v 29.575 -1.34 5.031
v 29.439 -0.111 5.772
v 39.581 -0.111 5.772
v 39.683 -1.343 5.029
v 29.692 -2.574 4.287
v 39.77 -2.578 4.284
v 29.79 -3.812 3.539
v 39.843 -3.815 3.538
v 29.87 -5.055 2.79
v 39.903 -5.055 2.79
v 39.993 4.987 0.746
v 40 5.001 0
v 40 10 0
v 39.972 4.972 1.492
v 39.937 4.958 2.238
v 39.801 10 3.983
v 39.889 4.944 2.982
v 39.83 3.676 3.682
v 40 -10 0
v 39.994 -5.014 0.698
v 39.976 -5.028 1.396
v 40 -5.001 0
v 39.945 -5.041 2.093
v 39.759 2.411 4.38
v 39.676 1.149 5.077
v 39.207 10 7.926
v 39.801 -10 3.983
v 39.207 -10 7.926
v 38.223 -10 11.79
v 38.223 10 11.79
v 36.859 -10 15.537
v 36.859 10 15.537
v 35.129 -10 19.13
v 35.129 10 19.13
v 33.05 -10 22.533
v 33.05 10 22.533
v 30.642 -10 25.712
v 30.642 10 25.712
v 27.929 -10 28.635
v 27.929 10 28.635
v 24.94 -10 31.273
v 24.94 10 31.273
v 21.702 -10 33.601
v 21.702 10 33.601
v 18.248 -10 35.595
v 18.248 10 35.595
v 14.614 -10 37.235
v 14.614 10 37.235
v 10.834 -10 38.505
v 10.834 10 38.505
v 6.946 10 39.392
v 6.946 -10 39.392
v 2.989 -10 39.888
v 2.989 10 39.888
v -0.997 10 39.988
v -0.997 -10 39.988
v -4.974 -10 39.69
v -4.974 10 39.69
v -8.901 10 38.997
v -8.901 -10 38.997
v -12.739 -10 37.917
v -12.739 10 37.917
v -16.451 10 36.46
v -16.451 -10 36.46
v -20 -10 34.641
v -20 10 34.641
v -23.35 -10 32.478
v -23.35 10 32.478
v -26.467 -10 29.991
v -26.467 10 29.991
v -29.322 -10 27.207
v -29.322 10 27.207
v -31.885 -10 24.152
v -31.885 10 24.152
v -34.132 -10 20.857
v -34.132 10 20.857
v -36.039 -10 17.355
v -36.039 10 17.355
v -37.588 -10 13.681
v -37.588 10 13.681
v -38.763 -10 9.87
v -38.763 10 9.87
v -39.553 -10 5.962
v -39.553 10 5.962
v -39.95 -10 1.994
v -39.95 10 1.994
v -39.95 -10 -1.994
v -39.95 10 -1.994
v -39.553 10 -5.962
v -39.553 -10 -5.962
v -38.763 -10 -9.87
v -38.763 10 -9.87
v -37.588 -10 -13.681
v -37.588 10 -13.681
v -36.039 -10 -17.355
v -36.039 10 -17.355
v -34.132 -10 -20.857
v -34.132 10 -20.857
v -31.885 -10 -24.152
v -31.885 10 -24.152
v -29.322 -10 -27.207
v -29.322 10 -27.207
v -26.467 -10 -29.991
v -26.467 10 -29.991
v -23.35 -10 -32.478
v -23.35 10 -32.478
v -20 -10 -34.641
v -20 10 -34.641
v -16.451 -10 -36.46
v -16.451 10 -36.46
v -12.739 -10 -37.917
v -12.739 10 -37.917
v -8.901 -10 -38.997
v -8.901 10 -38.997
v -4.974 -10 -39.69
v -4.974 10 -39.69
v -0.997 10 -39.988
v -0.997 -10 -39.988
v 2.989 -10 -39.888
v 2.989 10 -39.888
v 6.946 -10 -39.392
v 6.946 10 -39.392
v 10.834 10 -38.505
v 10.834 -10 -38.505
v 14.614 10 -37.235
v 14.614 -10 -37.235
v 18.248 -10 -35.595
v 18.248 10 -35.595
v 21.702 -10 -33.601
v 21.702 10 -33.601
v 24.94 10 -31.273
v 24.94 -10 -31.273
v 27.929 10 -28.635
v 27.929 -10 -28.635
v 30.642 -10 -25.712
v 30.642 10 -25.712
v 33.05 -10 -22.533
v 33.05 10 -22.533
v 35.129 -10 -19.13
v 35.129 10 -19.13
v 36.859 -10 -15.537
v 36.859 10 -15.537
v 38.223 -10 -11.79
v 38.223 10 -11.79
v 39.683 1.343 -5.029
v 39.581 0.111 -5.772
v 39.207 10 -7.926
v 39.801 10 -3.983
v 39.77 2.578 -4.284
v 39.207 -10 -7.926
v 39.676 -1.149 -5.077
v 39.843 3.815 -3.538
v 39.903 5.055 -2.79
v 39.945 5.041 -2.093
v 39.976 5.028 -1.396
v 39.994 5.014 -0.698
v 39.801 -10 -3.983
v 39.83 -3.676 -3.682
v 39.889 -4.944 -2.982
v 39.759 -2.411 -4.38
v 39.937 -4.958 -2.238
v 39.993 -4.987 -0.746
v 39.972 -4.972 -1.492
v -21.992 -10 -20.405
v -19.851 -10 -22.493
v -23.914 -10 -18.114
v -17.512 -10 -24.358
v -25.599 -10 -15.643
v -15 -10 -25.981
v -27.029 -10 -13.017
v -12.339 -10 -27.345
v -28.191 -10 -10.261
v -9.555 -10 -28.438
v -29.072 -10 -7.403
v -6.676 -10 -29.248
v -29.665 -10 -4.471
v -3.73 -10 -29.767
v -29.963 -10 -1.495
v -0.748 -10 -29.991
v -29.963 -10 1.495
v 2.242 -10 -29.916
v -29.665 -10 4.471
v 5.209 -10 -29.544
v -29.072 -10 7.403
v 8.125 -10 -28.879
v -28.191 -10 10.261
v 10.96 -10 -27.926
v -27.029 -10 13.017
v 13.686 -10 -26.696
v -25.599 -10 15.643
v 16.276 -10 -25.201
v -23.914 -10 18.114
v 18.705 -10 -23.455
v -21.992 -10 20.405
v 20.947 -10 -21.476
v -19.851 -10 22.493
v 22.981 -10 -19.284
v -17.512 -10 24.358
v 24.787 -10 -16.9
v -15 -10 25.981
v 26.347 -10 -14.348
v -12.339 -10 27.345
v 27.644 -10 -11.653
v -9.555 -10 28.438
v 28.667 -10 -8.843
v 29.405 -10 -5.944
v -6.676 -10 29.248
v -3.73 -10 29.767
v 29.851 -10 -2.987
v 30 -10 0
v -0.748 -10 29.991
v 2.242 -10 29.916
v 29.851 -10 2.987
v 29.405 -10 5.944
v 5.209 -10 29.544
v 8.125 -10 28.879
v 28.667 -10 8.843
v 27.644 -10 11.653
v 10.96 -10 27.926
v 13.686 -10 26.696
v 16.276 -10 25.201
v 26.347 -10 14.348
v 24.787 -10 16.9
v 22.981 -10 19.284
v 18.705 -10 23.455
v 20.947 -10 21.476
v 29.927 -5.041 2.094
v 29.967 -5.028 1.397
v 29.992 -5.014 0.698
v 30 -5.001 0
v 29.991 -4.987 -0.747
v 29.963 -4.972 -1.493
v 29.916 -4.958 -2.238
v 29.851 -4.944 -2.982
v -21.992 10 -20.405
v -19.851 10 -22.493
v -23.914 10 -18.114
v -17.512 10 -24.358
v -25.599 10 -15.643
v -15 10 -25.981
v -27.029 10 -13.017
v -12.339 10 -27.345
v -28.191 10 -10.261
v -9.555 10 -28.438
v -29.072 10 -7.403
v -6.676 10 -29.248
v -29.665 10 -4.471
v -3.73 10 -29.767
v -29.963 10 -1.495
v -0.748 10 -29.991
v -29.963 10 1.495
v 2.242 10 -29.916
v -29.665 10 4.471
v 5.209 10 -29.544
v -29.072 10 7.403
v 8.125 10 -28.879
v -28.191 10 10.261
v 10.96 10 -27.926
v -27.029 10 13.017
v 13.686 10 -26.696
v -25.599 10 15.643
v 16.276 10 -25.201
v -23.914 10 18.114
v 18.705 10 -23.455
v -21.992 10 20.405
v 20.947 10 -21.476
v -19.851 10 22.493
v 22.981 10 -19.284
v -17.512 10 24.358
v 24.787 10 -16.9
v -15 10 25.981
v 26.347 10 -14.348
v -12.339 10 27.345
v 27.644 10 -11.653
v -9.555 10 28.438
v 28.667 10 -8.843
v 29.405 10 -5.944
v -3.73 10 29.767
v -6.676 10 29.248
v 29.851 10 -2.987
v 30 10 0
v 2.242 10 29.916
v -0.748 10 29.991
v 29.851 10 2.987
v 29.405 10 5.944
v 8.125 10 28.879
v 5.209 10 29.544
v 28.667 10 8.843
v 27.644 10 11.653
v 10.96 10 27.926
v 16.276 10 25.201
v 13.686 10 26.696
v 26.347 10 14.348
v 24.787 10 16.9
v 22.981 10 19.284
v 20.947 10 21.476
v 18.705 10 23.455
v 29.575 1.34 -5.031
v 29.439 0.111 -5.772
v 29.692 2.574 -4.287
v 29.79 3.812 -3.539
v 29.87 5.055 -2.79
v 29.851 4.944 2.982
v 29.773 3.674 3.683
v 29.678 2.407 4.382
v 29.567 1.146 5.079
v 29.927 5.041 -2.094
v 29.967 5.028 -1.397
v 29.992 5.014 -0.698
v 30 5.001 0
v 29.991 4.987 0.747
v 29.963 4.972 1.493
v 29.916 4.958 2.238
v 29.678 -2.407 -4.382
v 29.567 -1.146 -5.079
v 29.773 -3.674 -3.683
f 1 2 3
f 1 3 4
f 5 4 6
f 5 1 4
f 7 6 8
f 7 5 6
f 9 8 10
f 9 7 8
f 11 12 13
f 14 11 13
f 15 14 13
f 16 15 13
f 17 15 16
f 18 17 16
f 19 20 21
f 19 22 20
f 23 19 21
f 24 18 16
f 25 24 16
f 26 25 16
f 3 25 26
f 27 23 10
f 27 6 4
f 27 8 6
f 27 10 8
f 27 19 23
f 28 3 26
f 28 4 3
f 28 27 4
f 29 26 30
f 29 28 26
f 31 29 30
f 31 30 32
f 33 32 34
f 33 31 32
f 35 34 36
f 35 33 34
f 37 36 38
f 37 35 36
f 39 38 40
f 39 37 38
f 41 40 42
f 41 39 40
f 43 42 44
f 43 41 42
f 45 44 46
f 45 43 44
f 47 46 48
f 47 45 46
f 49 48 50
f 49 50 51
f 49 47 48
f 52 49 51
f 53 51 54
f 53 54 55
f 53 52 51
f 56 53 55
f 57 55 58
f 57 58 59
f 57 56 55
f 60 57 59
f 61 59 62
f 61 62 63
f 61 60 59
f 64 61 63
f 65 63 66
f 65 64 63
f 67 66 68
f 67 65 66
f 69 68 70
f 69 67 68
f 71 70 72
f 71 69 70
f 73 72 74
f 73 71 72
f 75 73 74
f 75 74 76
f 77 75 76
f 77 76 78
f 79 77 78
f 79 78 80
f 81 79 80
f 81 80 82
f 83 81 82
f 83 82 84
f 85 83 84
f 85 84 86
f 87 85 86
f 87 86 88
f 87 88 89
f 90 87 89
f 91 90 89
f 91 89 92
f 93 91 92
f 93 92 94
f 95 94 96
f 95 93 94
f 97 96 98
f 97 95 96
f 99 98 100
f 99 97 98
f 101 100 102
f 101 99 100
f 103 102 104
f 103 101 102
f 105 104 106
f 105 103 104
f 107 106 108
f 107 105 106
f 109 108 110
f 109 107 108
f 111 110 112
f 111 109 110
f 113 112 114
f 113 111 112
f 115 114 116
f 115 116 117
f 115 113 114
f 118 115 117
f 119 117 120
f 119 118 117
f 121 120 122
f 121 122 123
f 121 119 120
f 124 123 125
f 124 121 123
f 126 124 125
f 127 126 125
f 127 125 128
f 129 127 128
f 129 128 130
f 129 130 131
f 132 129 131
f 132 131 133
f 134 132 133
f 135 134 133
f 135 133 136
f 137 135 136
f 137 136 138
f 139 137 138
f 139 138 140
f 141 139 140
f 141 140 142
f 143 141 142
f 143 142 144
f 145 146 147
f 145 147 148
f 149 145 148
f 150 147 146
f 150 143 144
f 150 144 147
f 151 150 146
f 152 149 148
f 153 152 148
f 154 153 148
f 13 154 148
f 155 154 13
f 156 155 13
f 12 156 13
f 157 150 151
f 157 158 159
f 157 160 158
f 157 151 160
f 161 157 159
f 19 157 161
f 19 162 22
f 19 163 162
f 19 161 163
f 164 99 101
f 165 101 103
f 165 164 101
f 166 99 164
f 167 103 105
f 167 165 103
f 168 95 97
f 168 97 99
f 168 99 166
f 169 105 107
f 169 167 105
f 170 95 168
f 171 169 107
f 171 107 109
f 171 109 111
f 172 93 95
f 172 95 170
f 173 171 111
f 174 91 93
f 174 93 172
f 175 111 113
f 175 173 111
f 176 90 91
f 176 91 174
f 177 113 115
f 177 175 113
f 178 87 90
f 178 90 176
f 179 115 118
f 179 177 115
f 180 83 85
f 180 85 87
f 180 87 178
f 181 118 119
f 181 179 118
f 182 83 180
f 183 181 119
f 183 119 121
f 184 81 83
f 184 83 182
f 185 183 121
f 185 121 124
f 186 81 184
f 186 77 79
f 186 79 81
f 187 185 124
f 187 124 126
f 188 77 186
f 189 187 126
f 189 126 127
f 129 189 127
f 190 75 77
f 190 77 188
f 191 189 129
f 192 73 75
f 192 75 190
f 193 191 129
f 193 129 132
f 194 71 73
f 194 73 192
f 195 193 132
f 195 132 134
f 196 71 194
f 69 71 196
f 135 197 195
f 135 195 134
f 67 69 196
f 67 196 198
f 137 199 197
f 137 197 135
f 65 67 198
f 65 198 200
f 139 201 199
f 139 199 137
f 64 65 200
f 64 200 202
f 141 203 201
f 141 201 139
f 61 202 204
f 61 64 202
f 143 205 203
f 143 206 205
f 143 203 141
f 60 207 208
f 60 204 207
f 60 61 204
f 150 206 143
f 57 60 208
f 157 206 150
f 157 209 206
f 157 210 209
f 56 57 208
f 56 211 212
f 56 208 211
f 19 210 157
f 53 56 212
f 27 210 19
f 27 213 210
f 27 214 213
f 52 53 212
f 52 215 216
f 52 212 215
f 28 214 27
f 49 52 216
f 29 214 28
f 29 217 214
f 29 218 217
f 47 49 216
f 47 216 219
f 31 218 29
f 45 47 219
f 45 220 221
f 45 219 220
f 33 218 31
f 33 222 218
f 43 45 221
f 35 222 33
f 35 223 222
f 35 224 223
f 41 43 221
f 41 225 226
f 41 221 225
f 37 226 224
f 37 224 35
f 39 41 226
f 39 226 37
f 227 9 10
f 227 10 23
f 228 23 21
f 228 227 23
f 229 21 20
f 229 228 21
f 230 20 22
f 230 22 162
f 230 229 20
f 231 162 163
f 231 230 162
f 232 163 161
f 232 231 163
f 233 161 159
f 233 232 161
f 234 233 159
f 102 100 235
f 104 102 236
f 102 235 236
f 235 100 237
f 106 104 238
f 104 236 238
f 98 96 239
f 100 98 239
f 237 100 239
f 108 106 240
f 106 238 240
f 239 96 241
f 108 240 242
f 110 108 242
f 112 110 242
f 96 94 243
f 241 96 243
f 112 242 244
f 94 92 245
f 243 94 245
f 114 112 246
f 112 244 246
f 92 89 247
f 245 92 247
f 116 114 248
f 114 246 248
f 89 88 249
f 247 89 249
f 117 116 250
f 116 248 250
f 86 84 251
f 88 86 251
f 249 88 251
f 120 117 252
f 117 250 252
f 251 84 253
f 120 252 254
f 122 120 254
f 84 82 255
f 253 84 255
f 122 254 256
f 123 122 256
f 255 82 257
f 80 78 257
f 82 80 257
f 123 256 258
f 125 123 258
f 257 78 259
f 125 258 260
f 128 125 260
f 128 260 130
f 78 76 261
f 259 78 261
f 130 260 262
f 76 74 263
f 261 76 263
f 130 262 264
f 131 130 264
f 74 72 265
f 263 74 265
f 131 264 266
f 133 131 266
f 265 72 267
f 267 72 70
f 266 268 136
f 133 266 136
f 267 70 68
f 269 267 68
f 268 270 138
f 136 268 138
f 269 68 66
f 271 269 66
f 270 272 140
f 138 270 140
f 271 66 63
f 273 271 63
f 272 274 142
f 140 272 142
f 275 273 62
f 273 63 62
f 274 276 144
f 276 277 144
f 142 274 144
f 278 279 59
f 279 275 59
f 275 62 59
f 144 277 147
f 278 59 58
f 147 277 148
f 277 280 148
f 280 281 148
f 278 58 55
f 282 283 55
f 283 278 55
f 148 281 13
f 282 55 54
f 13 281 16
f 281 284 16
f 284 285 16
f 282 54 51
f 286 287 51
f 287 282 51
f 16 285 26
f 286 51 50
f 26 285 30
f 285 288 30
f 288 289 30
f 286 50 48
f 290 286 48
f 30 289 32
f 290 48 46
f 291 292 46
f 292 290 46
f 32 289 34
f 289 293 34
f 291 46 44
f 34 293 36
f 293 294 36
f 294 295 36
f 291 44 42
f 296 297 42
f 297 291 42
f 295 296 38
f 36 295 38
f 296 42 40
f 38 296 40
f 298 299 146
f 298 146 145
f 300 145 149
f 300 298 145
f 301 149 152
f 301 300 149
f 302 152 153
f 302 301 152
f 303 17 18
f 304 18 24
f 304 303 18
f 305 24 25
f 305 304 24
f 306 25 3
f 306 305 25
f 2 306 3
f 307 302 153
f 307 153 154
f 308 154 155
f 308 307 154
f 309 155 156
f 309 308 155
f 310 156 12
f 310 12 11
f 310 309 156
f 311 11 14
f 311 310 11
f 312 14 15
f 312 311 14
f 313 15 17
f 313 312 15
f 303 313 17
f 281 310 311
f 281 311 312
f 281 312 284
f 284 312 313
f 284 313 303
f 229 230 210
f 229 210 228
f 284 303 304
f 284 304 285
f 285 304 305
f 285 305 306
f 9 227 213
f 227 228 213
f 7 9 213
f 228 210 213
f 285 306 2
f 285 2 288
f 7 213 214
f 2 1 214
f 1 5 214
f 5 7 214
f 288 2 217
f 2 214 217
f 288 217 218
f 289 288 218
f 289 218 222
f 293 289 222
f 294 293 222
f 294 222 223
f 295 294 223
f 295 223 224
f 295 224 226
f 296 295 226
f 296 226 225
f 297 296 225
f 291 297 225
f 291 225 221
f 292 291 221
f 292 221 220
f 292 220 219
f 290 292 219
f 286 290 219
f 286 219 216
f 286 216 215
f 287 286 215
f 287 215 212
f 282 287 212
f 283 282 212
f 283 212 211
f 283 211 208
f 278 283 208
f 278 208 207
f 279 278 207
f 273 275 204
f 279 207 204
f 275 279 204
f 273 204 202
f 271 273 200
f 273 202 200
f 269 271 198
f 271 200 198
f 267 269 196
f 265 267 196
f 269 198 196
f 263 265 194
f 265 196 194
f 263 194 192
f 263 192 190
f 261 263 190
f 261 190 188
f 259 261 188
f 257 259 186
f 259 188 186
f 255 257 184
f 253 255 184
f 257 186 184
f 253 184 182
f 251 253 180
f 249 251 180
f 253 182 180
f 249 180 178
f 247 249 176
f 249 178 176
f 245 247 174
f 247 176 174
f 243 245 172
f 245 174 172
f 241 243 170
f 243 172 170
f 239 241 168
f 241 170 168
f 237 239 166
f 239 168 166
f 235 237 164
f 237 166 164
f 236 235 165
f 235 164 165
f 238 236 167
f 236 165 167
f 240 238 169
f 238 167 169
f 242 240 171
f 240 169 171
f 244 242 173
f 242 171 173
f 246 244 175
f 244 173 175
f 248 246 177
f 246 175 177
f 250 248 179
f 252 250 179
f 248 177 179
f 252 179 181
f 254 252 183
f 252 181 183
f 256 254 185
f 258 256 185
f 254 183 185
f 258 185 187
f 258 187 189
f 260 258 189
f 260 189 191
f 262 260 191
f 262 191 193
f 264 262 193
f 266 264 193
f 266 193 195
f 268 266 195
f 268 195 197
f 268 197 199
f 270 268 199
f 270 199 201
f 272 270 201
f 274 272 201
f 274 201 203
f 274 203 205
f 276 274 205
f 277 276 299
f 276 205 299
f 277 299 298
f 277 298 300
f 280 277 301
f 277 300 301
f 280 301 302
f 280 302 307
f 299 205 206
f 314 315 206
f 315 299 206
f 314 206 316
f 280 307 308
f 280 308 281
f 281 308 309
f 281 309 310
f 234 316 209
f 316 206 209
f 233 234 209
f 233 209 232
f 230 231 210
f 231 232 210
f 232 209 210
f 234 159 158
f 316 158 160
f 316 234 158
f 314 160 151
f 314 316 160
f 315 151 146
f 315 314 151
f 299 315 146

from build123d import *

# Parameters (mm, degrees)
F0_R     = 40
F1_DEPTH = 10
F2_R     = 30
F3_DEPTH = 20
F5_DEPTH = 60


with BuildPart() as f1:
    # F0 (on Front) → F1 (new body, symmetric)
    with BuildSketch(Plane.XZ):
        Circle(F0_R)
    extrude(amount=F1_DEPTH, both=True)

    # F2 (on face) → F3 (cut, through all)
    with BuildSketch(Plane.XZ.offset(10)):
        Circle(F2_R)
    extrude(amount=-F3_DEPTH, mode=Mode.SUBTRACT)

    # F4 (on Right) → F5 (cut)
    with BuildSketch(Plane.YZ):
        Polygon((4.943565, 2.982364), (-0.111021, 5.772435), (-5.054586, 2.790071), (-4.943565, -2.982364), (0.111021, -5.772435), (5.054586, -2.790071), align=None)
    extrude(amount=F5_DEPTH, mode=Mode.SUBTRACT)


solid = f1.part
